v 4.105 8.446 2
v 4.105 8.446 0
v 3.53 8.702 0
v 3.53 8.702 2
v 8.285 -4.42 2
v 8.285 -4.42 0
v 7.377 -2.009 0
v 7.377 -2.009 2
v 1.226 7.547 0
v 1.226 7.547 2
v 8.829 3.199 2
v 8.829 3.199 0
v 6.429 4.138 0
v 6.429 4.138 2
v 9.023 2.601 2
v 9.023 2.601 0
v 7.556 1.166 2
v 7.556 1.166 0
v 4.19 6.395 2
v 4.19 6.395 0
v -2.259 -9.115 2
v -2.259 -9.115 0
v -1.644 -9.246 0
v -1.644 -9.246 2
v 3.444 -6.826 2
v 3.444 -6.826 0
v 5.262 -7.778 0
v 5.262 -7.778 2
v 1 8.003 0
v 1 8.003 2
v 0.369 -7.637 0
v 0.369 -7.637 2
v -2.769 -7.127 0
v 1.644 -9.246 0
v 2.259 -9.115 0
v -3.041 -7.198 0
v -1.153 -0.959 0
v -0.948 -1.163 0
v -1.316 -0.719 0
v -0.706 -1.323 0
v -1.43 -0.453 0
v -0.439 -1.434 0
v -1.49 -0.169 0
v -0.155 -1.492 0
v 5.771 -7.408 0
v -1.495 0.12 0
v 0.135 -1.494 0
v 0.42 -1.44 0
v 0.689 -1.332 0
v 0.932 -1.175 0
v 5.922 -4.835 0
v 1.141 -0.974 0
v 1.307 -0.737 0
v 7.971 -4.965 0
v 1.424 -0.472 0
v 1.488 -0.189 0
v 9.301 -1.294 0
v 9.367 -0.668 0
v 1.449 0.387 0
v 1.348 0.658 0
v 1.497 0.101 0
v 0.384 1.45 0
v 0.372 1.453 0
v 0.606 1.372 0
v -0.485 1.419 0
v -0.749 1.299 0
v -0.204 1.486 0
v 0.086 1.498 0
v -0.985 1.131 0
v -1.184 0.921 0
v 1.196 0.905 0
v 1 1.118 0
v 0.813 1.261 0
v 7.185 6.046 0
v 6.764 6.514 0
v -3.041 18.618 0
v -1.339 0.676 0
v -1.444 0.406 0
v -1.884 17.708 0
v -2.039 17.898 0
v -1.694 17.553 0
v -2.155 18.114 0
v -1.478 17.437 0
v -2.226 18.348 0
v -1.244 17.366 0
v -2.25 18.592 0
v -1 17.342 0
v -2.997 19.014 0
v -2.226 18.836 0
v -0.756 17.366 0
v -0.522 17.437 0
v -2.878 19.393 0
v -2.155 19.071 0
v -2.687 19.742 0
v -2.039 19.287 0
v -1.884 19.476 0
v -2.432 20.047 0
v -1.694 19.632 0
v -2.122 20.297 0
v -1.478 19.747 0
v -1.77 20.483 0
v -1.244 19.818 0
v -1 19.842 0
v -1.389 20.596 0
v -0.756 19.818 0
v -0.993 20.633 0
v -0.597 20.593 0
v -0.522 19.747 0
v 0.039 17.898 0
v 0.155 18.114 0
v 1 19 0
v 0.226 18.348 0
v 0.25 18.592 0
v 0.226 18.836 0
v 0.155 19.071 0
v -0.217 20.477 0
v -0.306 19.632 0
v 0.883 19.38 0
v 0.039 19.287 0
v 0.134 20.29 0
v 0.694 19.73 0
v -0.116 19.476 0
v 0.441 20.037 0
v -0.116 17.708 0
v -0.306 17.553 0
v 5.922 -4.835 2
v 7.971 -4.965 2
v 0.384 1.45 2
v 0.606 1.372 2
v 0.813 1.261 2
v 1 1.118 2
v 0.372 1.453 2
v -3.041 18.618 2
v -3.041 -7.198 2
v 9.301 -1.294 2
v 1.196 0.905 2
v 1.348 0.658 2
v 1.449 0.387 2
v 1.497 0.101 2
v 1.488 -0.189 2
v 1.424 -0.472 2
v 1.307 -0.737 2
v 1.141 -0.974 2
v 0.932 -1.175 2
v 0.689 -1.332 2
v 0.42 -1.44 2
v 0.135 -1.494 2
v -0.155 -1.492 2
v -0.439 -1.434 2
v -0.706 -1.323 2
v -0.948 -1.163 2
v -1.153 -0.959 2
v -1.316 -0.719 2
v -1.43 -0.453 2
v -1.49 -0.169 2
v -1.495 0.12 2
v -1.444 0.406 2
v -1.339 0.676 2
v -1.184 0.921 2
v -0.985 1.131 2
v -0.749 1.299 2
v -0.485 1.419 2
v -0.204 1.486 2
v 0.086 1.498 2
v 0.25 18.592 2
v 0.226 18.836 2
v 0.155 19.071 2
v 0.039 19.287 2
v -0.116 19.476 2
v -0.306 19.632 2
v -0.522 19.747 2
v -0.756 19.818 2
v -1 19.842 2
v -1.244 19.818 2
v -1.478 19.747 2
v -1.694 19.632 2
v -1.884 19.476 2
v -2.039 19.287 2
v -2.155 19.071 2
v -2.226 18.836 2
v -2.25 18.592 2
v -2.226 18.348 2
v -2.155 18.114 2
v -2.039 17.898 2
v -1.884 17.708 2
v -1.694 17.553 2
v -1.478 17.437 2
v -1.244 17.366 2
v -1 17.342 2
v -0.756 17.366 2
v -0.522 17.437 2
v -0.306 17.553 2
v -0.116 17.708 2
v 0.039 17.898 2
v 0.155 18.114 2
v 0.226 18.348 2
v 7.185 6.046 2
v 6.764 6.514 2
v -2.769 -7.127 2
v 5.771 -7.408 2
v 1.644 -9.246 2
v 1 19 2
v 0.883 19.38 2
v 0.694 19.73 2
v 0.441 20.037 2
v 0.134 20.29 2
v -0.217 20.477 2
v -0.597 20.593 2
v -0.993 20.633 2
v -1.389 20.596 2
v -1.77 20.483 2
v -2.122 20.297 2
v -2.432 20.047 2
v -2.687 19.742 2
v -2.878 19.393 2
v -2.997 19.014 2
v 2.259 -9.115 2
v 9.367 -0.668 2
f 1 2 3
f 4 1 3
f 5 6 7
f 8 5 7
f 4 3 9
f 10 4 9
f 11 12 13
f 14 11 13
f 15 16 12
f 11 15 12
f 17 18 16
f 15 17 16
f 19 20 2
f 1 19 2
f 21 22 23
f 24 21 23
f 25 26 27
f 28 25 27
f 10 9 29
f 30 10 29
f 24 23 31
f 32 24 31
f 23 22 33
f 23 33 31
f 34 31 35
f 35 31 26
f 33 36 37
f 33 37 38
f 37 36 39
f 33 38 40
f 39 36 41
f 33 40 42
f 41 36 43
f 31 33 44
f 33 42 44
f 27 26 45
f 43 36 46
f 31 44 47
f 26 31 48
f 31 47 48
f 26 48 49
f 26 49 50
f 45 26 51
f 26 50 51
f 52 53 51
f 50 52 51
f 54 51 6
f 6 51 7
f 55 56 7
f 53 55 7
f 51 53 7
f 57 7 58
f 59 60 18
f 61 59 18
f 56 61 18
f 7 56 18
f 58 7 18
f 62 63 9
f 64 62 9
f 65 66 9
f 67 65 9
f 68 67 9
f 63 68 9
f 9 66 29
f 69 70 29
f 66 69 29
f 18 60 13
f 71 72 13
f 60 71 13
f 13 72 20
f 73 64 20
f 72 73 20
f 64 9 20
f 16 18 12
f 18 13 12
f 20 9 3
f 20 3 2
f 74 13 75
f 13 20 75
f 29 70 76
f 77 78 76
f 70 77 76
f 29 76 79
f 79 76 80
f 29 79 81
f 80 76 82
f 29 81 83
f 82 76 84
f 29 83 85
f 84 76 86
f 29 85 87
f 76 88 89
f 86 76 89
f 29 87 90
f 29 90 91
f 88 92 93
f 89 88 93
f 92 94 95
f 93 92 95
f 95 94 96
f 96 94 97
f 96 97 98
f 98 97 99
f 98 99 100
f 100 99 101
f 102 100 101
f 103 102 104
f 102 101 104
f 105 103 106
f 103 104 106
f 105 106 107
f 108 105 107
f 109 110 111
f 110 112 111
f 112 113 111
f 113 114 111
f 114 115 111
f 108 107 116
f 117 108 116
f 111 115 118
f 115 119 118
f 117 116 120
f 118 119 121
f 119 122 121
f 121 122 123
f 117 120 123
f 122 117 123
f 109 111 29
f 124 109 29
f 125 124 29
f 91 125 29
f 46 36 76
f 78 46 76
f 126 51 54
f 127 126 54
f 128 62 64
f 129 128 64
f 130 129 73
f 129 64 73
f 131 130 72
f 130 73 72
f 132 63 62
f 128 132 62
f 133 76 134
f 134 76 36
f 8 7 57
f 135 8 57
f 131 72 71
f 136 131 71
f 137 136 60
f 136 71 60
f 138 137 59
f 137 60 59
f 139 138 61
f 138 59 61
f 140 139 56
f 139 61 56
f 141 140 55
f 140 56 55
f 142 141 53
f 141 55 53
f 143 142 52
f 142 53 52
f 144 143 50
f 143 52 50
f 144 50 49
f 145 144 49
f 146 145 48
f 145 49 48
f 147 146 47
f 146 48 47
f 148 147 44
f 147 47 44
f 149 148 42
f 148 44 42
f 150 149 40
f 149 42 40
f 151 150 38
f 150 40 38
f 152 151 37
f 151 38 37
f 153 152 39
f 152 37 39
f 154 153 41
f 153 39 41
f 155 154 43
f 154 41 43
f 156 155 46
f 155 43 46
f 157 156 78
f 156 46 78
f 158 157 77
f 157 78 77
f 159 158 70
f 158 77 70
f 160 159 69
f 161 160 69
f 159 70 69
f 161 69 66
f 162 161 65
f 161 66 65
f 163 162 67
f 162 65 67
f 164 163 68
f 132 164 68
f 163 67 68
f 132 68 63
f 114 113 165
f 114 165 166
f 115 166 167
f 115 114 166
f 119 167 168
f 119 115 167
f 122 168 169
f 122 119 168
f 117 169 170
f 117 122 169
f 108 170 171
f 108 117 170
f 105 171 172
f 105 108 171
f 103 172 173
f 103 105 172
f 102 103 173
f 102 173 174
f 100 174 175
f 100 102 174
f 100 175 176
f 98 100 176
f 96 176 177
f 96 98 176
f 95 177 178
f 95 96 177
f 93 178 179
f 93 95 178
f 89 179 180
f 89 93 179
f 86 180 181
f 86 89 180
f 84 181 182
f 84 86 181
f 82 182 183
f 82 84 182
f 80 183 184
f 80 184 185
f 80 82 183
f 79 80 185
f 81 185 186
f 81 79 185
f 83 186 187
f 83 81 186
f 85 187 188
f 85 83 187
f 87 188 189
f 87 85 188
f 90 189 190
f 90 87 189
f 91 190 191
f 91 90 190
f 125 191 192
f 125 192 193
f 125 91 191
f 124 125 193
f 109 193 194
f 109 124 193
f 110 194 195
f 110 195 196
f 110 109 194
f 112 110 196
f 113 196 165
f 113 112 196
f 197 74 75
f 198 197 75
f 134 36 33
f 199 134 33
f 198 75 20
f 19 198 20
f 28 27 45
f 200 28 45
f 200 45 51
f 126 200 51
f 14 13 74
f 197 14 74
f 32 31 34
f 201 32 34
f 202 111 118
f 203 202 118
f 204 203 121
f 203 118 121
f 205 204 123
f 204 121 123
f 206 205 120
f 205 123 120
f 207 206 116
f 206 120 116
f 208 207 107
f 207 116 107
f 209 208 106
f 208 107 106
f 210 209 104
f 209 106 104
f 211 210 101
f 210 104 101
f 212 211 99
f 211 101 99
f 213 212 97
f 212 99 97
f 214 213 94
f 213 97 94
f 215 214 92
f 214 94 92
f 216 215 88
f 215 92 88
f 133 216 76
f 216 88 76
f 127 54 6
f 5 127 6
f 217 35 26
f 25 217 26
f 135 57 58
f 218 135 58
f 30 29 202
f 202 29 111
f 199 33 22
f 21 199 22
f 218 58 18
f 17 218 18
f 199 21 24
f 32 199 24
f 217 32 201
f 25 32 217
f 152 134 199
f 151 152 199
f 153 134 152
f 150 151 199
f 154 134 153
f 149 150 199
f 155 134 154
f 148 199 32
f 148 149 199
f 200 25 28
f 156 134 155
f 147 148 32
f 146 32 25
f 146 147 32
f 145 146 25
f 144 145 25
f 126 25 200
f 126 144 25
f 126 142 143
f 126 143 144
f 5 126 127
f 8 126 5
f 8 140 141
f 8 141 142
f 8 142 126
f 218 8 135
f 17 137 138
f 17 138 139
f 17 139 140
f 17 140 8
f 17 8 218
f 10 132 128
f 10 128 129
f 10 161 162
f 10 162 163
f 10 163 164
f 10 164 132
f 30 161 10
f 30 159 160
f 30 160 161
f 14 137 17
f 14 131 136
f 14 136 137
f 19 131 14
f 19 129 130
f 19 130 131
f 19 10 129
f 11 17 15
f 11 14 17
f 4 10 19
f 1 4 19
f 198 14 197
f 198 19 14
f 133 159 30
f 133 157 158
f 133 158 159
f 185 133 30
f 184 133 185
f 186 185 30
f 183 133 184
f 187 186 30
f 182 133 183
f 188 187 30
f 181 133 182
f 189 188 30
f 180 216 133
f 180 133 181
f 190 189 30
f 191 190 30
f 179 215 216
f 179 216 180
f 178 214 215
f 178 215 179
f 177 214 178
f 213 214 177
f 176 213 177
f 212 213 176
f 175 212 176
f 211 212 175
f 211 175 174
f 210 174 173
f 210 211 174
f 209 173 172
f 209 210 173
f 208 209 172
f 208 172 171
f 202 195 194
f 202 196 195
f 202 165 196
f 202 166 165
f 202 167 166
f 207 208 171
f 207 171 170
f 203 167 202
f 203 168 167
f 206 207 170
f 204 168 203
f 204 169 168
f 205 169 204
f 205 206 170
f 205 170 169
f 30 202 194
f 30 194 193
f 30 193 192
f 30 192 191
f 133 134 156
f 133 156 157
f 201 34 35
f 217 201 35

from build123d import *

# Parameters (mm, degrees)
SKETCH1_R           = 1.25
BOSS_EXTRUDE2_DEPTH = 2


with BuildPart() as part:
    # Sketch1 → Boss-Extrude2 (new body)
    with BuildSketch(Plane.XY):
        with BuildLine():
            Line((8.285184221, -4.420298479), (7.377074087, -2.008607594))
            Line((7.377074087, -2.008607594), (9.301041093, -1.293812508))
            Line((9.301041093, -1.293812508), (9.366789776, -0.66825558))
            Line((9.366789776, -0.66825558), (7.556266833, 1.165572006))
            Line((7.556266833, 1.165572006), (9.023164798, 2.601117692))
            Line((9.023164798, 2.601117692), (8.828792284, 3.199334781))
            Line((8.828792284, 3.199334781), (6.428912397, 4.138213618))
            Line((6.428912397, 4.138213618), (7.185101337, 6.046291012))
            Line((7.185101337, 6.046291012), (6.764216399, 6.513731092))
            Line((6.764216399, 6.513731092), (4.189940603, 6.3953205))
            Line((4.189940603, 6.3953205), (4.10466858, 8.446005688))
            Line((4.10466858, 8.446005688), (3.530046047, 8.701844123))
            Line((3.530046047, 8.701844123), (1.226490014, 7.546618369))
            Line((1.226490014, 7.546618369), (1, 8.003257429))
            Line((1, 8.003257429), (1, 19))
            ThreePointArc((1, 19), (-1.19198009, 20.624419756), (-3.040958638, 18.618230684))
            Line((-3.040958638, 18.618230684), (-3.040958638, -7.197788875))
            Line((-3.040958638, -7.197788875), (-2.76871845, -7.126705038))
            Line((-2.76871845, -7.126705038), (-2.2589484, -9.114848784))
            Line((-2.2589484, -9.114848784), (-1.643690947, -9.245625793))
            Line((-1.643690947, -9.245625793), (0.36934192, -7.636708264))
            Line((0.36934192, -7.636708264), (1.643690947, -9.245625793))
            Line((1.643690947, -9.245625793), (2.2589484, -9.114848784))
            Line((2.2589484, -9.114848784), (3.443539717, -6.826255253))
            Line((3.443539717, -6.826255253), (5.262121196, -7.777750108))
            Line((5.262121196, -7.777750108), (5.770995046, -7.408031615))
            Line((5.770995046, -7.408031615), (5.922318213, -4.835480694))
            Line((5.922318213, -4.835480694), (7.970682886, -4.965030771))
            Line((7.970682886, -4.965030771), (8.285184221, -4.420298479))
        make_face()
        with BuildLine():
            ThreePointArc((0.384303163, 1.449934853), (0.711767769, 1.320373675), (1, 1.118033989))
            ThreePointArc((1, 1.118033989), (-0.706323533, -1.323294021), (0.372346585, 1.45305128))
            Line((0.372346585, 1.45305128), (0.384303163, 1.449934853))
        make_face(mode=Mode.SUBTRACT)
        with Locations((-1, 18.592345483)):
            Circle(SKETCH1_R, mode=Mode.SUBTRACT)
    extrude(amount=BOSS_EXTRUDE2_DEPTH)


solid = part.part
